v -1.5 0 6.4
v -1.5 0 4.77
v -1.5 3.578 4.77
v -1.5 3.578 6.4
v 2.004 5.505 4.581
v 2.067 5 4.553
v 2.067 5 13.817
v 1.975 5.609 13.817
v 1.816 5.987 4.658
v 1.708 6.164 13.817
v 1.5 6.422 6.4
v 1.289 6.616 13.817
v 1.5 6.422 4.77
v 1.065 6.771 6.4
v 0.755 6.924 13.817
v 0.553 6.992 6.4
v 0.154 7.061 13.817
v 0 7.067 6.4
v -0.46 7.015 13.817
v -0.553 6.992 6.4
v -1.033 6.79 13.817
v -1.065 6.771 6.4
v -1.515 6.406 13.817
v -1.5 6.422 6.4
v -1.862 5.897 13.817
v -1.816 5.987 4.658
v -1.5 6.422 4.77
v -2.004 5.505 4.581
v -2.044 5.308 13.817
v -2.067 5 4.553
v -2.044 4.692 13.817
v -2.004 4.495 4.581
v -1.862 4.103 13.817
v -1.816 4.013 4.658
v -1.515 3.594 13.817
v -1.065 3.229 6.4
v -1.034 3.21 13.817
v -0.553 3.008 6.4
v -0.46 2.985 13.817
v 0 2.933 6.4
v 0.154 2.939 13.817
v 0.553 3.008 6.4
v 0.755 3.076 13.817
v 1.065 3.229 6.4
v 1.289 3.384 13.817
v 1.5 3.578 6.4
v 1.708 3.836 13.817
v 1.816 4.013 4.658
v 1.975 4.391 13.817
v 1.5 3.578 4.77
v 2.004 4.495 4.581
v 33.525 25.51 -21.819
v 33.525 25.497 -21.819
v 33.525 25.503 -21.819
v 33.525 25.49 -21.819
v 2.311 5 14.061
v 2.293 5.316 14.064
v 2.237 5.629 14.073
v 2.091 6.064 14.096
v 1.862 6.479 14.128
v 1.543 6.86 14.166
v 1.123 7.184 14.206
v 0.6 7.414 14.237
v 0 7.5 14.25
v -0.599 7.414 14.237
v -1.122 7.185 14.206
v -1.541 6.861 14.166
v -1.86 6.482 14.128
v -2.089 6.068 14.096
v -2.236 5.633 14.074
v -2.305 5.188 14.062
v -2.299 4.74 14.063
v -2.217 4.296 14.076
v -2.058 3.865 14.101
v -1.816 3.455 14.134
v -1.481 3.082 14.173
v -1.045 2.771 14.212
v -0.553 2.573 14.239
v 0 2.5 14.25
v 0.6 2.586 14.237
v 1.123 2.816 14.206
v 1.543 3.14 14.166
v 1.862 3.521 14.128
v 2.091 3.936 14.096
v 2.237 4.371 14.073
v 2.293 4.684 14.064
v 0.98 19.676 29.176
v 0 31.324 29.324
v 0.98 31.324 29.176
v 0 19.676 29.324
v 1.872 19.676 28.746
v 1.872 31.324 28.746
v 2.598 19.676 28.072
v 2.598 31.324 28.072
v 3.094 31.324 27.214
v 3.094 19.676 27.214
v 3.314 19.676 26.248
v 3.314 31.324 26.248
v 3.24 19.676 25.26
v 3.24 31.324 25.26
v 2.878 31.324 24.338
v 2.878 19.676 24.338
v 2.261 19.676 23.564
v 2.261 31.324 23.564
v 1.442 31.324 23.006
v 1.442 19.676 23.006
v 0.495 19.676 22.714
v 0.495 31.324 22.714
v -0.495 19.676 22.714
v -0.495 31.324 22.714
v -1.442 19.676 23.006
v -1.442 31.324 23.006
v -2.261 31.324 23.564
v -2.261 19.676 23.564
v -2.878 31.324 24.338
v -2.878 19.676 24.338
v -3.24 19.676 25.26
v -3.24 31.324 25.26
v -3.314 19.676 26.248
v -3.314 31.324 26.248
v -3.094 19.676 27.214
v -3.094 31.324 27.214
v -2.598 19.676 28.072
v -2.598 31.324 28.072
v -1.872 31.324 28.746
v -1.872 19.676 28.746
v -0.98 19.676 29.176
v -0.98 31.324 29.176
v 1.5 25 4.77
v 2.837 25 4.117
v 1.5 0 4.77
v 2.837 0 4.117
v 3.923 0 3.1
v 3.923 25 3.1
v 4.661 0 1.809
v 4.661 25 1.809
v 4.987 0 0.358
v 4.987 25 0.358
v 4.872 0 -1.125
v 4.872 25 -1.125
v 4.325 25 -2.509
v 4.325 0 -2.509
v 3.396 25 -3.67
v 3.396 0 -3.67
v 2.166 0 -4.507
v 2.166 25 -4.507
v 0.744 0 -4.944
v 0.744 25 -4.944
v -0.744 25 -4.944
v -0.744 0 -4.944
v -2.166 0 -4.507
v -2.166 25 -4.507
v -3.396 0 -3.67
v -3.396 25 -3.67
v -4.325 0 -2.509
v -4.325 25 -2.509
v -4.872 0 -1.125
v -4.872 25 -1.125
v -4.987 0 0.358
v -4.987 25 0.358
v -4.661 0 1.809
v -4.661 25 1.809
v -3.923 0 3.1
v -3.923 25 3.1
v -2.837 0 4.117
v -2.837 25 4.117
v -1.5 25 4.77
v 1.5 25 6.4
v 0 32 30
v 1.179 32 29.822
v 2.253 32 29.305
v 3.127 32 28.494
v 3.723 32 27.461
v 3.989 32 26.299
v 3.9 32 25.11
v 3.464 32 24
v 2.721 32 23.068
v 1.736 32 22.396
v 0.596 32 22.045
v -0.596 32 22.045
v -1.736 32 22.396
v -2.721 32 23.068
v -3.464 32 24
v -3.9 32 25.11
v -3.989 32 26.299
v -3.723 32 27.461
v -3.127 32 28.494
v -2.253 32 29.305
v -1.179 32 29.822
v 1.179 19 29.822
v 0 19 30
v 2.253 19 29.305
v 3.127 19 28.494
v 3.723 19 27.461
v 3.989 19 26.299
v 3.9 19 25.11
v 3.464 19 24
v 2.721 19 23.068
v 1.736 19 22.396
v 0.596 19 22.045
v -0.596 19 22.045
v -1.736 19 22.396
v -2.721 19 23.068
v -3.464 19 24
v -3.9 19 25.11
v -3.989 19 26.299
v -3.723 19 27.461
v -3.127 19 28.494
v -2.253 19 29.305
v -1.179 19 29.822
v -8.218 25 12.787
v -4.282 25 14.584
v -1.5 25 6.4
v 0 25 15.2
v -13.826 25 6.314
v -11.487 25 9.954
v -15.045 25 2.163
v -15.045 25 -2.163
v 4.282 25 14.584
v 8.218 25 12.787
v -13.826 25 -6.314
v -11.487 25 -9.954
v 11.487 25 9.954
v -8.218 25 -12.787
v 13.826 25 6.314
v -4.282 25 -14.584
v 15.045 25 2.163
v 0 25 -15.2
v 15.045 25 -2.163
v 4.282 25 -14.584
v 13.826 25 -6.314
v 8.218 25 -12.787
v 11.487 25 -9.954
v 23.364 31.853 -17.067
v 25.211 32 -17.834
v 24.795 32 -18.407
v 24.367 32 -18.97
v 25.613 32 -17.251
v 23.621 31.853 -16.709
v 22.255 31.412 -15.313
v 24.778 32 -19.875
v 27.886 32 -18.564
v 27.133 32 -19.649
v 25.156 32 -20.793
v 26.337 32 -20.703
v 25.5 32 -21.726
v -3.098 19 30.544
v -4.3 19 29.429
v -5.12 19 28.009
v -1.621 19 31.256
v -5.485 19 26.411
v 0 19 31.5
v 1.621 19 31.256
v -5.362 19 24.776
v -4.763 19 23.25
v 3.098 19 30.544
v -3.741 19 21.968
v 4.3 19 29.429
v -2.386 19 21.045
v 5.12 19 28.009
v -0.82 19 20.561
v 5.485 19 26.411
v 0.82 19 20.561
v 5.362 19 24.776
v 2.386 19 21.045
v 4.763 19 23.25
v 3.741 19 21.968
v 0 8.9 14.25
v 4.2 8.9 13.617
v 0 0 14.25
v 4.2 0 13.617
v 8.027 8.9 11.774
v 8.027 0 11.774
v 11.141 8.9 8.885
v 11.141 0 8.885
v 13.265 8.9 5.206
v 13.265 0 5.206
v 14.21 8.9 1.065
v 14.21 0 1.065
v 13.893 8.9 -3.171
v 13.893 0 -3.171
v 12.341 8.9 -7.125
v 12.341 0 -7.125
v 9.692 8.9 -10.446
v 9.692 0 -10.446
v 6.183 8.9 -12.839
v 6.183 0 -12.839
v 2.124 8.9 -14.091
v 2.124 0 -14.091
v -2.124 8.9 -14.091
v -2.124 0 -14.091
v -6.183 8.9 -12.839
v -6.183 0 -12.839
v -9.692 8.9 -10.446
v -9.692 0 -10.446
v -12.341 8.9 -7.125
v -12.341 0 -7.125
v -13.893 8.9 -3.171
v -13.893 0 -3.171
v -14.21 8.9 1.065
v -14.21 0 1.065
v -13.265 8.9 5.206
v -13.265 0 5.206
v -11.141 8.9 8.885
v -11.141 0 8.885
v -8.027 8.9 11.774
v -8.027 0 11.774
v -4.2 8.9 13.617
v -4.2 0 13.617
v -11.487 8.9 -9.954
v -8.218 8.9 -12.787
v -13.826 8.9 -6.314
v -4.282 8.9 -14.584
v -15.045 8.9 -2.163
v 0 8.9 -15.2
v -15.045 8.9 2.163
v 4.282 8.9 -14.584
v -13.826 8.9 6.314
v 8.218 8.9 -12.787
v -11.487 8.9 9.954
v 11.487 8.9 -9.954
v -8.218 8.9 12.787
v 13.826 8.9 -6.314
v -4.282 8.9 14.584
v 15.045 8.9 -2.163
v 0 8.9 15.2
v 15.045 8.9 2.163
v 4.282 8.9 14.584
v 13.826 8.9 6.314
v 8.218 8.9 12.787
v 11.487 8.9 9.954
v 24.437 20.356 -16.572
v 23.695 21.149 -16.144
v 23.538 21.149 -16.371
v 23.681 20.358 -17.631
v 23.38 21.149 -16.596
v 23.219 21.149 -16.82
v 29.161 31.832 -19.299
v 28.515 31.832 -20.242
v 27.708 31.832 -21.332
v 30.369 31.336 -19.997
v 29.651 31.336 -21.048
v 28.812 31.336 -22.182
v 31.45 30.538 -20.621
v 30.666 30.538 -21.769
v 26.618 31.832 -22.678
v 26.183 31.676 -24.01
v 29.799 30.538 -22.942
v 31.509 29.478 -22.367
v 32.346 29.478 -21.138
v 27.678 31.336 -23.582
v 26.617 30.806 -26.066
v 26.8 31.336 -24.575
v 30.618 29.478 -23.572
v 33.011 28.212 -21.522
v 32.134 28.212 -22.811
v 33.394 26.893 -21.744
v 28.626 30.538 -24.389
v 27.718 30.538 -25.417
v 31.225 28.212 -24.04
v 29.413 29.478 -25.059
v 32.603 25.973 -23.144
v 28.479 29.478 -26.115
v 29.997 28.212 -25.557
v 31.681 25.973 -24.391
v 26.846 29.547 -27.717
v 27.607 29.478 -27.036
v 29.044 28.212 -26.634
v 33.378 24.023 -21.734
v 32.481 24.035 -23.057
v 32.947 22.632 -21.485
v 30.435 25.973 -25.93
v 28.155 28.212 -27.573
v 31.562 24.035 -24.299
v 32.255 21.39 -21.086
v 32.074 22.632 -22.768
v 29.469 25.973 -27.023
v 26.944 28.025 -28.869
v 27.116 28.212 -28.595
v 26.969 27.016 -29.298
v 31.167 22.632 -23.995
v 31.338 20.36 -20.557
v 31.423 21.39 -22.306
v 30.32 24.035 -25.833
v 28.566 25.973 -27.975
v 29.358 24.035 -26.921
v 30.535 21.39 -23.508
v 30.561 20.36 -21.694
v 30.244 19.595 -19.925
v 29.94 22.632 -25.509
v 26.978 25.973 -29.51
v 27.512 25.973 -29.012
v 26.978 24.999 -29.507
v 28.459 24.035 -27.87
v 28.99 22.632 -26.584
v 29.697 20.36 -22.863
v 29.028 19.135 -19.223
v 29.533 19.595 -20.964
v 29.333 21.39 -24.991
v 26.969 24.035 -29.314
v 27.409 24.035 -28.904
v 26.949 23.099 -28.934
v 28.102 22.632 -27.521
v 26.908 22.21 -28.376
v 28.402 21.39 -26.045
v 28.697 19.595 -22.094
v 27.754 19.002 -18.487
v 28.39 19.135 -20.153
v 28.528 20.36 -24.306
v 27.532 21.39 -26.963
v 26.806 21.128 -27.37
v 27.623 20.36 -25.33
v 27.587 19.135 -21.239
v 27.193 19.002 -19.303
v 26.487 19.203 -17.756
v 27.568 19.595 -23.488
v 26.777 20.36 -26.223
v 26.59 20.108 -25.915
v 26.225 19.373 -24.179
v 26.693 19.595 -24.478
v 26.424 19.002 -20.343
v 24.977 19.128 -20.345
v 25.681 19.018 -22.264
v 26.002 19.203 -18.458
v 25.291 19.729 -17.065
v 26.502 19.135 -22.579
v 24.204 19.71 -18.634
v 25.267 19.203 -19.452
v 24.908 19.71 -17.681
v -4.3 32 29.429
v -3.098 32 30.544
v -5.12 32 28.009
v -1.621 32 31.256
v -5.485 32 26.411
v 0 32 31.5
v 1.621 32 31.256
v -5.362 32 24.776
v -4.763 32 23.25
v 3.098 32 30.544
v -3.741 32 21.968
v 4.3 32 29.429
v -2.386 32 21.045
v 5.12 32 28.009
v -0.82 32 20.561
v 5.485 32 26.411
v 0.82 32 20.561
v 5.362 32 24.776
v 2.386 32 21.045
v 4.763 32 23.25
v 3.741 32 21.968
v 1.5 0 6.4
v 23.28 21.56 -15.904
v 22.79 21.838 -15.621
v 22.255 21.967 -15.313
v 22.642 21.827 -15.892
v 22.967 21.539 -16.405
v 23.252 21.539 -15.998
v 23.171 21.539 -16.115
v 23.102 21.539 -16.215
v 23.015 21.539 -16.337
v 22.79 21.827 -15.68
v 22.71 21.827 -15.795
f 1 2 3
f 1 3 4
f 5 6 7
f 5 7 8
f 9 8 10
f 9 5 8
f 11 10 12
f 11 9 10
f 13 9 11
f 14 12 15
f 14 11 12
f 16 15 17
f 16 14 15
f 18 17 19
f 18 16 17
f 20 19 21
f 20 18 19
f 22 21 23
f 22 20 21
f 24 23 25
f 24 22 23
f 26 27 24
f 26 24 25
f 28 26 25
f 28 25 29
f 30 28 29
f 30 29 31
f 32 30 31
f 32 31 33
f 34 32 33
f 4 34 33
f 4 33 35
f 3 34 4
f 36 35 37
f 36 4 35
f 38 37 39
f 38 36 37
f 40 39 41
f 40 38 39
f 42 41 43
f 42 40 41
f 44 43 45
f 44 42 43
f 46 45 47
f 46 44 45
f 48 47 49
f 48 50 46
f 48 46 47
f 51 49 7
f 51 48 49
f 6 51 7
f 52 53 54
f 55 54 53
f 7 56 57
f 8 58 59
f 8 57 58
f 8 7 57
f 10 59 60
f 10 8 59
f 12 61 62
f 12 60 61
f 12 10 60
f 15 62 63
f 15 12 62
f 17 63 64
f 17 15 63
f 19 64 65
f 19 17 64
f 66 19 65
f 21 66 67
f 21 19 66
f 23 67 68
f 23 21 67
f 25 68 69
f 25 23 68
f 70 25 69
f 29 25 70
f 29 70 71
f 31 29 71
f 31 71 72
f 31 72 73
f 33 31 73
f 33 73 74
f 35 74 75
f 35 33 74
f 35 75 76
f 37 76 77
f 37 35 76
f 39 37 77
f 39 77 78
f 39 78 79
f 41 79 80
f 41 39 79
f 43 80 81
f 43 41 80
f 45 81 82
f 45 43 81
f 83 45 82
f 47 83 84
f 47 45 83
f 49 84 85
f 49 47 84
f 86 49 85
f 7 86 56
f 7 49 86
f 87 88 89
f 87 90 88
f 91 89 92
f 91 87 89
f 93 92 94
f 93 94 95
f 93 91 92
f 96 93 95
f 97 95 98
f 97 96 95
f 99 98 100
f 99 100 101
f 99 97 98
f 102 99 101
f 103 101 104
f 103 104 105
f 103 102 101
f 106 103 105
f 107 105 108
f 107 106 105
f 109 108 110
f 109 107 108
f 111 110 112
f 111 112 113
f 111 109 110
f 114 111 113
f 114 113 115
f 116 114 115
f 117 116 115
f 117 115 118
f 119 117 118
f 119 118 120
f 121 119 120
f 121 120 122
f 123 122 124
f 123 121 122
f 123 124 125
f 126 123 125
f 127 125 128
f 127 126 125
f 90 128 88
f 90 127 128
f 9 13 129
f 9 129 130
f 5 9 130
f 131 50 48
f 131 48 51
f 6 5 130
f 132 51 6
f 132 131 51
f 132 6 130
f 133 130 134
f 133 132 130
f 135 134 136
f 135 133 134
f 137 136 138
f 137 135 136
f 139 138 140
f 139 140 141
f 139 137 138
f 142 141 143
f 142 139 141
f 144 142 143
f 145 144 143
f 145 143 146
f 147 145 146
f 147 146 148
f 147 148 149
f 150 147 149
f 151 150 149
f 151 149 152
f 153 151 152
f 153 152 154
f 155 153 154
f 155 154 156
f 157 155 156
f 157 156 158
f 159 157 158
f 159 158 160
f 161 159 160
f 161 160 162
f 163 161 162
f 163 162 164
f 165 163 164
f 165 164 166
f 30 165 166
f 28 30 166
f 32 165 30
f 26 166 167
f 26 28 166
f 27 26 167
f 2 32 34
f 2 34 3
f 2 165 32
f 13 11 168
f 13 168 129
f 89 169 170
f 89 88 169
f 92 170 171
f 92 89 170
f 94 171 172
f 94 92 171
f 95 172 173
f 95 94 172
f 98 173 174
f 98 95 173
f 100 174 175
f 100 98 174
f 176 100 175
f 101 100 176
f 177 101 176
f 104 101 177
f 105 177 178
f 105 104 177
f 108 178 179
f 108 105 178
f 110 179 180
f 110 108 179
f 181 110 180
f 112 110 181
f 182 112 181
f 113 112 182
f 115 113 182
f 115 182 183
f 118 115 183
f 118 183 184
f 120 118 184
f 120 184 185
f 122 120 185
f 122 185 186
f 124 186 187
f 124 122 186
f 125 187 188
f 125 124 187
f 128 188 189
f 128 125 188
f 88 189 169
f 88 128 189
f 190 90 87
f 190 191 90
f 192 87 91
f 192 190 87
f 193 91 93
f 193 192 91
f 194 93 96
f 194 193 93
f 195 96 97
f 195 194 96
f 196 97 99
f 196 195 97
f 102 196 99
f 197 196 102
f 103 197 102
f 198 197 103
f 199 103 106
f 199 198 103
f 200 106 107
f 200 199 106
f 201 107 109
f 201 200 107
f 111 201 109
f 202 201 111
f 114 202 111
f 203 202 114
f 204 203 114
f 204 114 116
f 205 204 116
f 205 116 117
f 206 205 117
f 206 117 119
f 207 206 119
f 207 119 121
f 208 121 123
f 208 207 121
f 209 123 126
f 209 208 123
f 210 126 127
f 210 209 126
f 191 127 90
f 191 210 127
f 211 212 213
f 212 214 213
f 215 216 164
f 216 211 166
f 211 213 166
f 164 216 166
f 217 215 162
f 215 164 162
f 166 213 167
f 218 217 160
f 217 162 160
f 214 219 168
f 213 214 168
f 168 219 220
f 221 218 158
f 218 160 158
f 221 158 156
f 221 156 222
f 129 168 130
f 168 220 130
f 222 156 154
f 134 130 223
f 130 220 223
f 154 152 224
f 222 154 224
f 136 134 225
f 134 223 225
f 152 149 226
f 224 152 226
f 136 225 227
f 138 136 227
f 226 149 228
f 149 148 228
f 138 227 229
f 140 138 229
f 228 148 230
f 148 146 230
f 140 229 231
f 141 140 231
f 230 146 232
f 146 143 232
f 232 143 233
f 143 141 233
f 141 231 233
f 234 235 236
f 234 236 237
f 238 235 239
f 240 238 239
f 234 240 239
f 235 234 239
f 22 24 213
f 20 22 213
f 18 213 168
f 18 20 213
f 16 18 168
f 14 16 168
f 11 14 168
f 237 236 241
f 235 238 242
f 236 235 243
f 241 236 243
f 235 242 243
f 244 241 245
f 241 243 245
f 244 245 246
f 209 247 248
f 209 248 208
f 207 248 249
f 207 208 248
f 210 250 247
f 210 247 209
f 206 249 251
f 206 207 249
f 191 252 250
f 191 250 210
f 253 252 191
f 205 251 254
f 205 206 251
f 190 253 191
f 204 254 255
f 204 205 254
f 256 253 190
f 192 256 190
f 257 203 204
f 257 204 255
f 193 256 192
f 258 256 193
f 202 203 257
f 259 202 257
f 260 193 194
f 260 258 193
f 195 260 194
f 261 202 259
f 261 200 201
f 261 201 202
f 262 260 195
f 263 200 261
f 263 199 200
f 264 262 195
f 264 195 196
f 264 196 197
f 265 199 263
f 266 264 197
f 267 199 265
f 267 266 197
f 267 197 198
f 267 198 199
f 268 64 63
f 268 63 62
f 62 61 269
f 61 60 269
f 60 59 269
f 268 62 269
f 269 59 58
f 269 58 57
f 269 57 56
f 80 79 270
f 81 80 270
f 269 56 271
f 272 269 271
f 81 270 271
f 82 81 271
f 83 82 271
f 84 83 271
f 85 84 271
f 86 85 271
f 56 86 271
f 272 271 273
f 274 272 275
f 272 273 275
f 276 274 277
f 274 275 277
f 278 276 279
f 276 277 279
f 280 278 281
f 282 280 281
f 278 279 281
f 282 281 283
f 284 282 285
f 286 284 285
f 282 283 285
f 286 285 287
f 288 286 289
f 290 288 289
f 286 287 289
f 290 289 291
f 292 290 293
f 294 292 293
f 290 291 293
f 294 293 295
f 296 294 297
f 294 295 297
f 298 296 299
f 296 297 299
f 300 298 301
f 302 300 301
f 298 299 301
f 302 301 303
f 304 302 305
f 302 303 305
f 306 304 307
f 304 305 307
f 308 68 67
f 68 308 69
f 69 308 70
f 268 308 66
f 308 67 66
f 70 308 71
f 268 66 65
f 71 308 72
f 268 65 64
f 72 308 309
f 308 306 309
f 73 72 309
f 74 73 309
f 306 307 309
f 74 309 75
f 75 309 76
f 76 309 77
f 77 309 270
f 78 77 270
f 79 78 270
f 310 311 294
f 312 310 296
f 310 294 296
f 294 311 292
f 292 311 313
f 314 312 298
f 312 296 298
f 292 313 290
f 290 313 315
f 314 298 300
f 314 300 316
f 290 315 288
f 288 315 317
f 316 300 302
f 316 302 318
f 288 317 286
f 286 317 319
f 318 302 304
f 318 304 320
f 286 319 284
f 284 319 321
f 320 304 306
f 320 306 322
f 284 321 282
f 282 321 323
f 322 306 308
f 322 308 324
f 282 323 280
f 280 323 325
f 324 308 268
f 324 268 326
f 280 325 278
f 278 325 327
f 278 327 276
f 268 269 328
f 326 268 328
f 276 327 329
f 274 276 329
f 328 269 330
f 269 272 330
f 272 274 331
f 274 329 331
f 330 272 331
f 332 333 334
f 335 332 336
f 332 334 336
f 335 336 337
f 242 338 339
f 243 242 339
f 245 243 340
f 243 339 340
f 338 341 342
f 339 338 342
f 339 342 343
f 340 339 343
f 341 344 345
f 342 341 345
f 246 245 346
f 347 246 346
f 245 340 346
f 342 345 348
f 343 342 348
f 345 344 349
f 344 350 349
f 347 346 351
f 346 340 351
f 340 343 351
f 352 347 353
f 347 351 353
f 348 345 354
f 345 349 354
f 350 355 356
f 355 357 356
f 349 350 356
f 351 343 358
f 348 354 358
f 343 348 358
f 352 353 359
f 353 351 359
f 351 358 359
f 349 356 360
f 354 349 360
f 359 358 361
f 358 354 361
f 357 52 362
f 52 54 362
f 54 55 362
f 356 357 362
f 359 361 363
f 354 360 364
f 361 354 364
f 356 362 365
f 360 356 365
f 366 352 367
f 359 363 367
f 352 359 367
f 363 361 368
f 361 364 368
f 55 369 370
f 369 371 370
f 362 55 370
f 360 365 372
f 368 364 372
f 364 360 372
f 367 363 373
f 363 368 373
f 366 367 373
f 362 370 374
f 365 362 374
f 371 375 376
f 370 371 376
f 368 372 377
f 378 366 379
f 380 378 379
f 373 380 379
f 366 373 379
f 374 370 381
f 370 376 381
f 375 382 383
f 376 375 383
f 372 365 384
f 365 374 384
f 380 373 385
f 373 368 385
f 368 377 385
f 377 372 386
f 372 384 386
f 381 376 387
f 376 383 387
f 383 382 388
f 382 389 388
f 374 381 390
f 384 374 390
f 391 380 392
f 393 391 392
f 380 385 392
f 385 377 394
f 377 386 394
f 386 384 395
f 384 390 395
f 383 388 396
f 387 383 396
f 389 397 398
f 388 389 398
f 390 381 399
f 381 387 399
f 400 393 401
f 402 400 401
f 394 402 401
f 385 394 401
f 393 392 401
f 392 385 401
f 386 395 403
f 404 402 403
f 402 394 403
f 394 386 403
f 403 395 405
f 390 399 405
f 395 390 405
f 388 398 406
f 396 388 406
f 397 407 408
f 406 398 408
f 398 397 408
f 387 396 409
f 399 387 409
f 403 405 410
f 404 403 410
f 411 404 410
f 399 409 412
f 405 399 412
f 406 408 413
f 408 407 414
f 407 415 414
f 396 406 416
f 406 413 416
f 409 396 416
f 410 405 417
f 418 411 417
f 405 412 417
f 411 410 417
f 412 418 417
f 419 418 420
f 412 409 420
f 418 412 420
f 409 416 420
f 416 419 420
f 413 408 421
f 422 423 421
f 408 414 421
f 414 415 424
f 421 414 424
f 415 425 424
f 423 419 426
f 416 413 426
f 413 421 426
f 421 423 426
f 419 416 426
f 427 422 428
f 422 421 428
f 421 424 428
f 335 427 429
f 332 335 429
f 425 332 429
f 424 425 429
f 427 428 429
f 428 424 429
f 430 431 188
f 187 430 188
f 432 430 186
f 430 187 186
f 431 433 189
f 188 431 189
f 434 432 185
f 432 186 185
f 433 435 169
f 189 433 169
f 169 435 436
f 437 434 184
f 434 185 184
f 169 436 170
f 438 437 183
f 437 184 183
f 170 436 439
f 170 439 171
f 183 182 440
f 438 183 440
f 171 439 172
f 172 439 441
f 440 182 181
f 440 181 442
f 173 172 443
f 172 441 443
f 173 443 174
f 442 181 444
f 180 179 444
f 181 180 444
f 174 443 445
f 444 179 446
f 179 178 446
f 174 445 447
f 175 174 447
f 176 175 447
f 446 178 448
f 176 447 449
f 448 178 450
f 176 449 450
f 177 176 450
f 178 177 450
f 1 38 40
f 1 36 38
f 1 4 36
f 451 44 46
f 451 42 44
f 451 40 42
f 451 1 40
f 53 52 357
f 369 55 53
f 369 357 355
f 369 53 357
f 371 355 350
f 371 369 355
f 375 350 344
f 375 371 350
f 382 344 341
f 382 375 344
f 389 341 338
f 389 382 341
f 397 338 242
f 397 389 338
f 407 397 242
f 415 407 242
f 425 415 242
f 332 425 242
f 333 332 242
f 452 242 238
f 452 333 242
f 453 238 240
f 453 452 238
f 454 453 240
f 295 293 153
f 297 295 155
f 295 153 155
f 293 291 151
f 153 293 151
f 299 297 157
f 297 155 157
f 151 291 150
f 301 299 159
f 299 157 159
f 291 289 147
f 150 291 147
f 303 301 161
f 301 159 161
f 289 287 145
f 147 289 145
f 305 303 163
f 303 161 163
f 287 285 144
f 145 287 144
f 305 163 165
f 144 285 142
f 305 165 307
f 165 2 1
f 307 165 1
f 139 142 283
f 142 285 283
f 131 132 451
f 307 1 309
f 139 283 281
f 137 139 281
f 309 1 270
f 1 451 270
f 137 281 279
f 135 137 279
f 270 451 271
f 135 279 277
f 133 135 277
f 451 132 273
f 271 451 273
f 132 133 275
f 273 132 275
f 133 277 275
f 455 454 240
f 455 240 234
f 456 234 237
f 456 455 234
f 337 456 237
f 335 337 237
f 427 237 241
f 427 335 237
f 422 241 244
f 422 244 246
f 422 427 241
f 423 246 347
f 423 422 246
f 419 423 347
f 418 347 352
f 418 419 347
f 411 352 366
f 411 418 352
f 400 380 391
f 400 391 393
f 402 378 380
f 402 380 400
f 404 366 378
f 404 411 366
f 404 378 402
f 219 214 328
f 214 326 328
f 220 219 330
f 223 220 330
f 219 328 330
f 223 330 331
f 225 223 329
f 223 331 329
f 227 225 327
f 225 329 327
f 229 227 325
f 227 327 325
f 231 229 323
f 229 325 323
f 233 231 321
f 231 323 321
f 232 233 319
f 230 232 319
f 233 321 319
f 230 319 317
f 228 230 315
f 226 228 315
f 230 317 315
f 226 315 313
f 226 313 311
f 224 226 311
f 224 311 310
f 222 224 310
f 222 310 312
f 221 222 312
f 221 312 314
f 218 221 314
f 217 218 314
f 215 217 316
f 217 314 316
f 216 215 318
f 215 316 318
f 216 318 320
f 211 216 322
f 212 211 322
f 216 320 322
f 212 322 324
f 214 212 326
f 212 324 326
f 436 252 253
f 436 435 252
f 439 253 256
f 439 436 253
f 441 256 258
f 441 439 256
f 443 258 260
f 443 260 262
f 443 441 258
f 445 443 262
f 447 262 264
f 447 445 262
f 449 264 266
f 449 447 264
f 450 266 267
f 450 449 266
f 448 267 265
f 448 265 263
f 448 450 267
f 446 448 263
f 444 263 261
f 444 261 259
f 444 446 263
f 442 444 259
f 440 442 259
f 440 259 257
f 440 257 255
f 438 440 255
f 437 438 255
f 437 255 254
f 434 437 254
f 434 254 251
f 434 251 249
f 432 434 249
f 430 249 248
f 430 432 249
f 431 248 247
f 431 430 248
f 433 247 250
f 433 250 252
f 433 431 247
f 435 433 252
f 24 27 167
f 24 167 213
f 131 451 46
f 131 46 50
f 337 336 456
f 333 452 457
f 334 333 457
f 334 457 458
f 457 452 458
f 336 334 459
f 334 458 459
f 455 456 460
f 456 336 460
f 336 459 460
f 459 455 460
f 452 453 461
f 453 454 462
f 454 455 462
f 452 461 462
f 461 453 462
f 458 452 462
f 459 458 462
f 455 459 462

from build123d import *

# Parameters (mm, degrees)
CUT_EXTRUDE_1_DEPTH    = 32
PATTERN_START          = 2
PATTERN_LINEAR_1_DEPTH = 30
SKETCH_5_W             = 5.5
SKETCH_5_H             = 13
CUT_EXTRUDE_2_DEPTH    = 25


# Read off the part's stored shape, not the designer's step: 阵列(线性)1
with BuildPart() as part:
    # 草图1 → 旋转1 (revolve)
    with BuildSketch(Plane.XY, mode=Mode.PRIVATE) as revolve_1_sk:
        with BuildLine():
            Line((0, 20), (5, 20))
            Line((5, 20), (5, 16.939442451))
            Line((5, 16.939442451), (23.498601429, 29.700772791))
            ThreePointArc((23.498601429, 29.700772791), (27.014696752, 31.411890394), (30.880570115, 32))
            Line((30.880570115, 32), (33.5, 32))
            ThreePointArc((33.5, 32), (39.438608051, 22.857475748), (28.671410524, 21.148595207))
            ThreePointArc((28.671410524, 21.148595207), (27.10540909, 21.957966627), (25.394651363, 21.5328189))
            Line((25.394651363, 21.5328189), (5, 7.463491323))
            Line((5, 7.463491323), (5, 2))
            Line((5, 2), (0, 2))
            Line((0, 2), (0, 20))
        make_face()
    revolve(revolve_1_sk.sketch.rotate(Axis((0, 0, 0), (0, 1, 0)), 270), axis=Axis((0, 0, 0), (0, 1, 0)))

    # 草图2 → 切除-拉伸1 (cut)
    with BuildSketch(Plane(origin=(0, 0, 0), x_dir=(1, 0, 0), z_dir=(0, 1, 0))):
        with BuildLine():
            Line((26.001324465, 7.275378072), (10.010517998, -1.956918346))
            ThreePointArc((10.010517998, -1.956918346), (8.833459119, -5.1), (6.7, -7.690903718))
            Line((6.7, -7.690903718), (6.7, -26.155496554))
            ThreePointArc((6.7, -26.155496554), (23.382685902, -13.5), (26.001324465, 7.275378072))
        make_face()
    extrude(amount=CUT_EXTRUDE_1_DEPTH, mode=Mode.SUBTRACT)

    # 阵列(线性)1 outline → 阵列(线性)1 (cut)
    with BuildSketch(Plane(origin=(0, 0, 0), x_dir=(1, 0, 0), z_dir=(0, 1, 0)).offset(PATTERN_START)):
        with BuildLine():
            Line((33.524972429, 21.819158249), (22.255200364, 15.312552314))
            ThreePointArc((22.255200364, 15.312552314), (25.62325476, 22.088313006), (26.978891649, 29.532570659))
            Line((26.978891649, 29.532570659), (27.472169879, 42))
            Line((27.472169879, 42), (-42, 42))
            Line((-42, 42), (-42, -42))
            Line((-42, -42), (42, -42))
            Line((42, -42), (42, 26.712217698))
            Line((42, 26.712217698), (33.524972429, 21.819158249))
        make_face()
        with BuildLine():
            Line((10.010517998, -1.956918346), (26.001324465, 7.275378072))
            ThreePointArc((26.001324465, 7.275378072), (23.382685902, -13.5), (6.7, -26.155496554))
            Line((6.7, -26.155496554), (6.7, -7.690903718))
            ThreePointArc((6.7, -7.690903718), (8.833459119, -5.1), (10.010517998, -1.956918346))
        make_face(mode=Mode.SUBTRACT)
    extrude(amount=PATTERN_LINEAR_1_DEPTH, mode=Mode.SUBTRACT)


with BuildPart() as body_2:
    # 草图4 → 旋转2 (revolve)
    with BuildSketch(Plane.XY, mode=Mode.PRIVATE) as revolve_2_sk:
        Polygon((0, 25), (15.2, 25), (15.2, 8.9), (14.25, 8.9), (14.25, 0), (0, 0), align=None)
    revolve(revolve_2_sk.sketch.rotate(Axis((0, 0, 0), (0, 1, 0)), 270), axis=Axis((0, 0, 0), (0, 1, 0)))

    # 草图7 → 切除-拉伸2 (cut)
    with BuildSketch(Plane(origin=(0, 0, 0), x_dir=(1, 0, 0), z_dir=(0, 1, 0))):
        with BuildLine():
            Line((-1.5, -4.769696007), (-1.5, -6.4))
            Line((-1.5, -6.4), (1.5, -6.4))
            Line((1.5, -6.4), (1.5, -4.769696007))
            ThreePointArc((1.5, -4.769696007), (0, 5), (-1.5, -4.769696007))
        make_face()
    extrude(amount=CUT_EXTRUDE_2_DEPTH, mode=Mode.SUBTRACT)

    # 草图8 → 切除-旋转2 (revolve, cut)
    with BuildSketch(Plane(origin=(0, 0, 0), x_dir=(0, 0, -1), z_dir=(1, 0, 0)), mode=Mode.PRIVATE) as cut_revolve_2_sk:
        Polygon((-14.25, 5), (-14.25, 7.5), (-13.817, 7.067), (-4.5, 7.067), (-4.5, 5), align=None)
    revolve(cut_revolve_2_sk.sketch.rotate(Axis((0, 5, 4.5), (0, 0, 1)), 270), axis=Axis((0, 5, 4.5), (0, 0, 1)), mode=Mode.SUBTRACT)


with BuildPart() as body_3:
    # 草图5 → 旋转3 (revolve)
    with BuildSketch(Plane(origin=(0, 0, 0), x_dir=(0, 0, -1), z_dir=(1, 0, 0)), mode=Mode.PRIVATE) as revolve_3_sk:
        with Locations((-23.25, 25.5)):
            Rectangle(SKETCH_5_W, SKETCH_5_H)
    revolve(revolve_3_sk.sketch.rotate(Axis((0, 19, 26), (0, 1, 0)), 180), axis=Axis((0, 19, 26), (0, 1, 0)))

    # 草图6 → 切除-旋转1 (revolve, cut)
    with BuildSketch(Plane(origin=(0, 0, 0), x_dir=(0, 0, -1), z_dir=(1, 0, 0)), mode=Mode.PRIVATE) as cut_revolve_1_sk:
        Polygon((-26, 32), (-22, 32), (-22.6765, 31.3235), (-22.6765, 19.6765), (-22, 19), (-26, 19), align=None)
    revolve(cut_revolve_1_sk.sketch.rotate(Axis((0, 19, 26), (0, 1, 0)), 180), axis=Axis((0, 19, 26), (0, 1, 0)), mode=Mode.SUBTRACT)


solid = Compound([part.part, body_2.part, body_3.part])
